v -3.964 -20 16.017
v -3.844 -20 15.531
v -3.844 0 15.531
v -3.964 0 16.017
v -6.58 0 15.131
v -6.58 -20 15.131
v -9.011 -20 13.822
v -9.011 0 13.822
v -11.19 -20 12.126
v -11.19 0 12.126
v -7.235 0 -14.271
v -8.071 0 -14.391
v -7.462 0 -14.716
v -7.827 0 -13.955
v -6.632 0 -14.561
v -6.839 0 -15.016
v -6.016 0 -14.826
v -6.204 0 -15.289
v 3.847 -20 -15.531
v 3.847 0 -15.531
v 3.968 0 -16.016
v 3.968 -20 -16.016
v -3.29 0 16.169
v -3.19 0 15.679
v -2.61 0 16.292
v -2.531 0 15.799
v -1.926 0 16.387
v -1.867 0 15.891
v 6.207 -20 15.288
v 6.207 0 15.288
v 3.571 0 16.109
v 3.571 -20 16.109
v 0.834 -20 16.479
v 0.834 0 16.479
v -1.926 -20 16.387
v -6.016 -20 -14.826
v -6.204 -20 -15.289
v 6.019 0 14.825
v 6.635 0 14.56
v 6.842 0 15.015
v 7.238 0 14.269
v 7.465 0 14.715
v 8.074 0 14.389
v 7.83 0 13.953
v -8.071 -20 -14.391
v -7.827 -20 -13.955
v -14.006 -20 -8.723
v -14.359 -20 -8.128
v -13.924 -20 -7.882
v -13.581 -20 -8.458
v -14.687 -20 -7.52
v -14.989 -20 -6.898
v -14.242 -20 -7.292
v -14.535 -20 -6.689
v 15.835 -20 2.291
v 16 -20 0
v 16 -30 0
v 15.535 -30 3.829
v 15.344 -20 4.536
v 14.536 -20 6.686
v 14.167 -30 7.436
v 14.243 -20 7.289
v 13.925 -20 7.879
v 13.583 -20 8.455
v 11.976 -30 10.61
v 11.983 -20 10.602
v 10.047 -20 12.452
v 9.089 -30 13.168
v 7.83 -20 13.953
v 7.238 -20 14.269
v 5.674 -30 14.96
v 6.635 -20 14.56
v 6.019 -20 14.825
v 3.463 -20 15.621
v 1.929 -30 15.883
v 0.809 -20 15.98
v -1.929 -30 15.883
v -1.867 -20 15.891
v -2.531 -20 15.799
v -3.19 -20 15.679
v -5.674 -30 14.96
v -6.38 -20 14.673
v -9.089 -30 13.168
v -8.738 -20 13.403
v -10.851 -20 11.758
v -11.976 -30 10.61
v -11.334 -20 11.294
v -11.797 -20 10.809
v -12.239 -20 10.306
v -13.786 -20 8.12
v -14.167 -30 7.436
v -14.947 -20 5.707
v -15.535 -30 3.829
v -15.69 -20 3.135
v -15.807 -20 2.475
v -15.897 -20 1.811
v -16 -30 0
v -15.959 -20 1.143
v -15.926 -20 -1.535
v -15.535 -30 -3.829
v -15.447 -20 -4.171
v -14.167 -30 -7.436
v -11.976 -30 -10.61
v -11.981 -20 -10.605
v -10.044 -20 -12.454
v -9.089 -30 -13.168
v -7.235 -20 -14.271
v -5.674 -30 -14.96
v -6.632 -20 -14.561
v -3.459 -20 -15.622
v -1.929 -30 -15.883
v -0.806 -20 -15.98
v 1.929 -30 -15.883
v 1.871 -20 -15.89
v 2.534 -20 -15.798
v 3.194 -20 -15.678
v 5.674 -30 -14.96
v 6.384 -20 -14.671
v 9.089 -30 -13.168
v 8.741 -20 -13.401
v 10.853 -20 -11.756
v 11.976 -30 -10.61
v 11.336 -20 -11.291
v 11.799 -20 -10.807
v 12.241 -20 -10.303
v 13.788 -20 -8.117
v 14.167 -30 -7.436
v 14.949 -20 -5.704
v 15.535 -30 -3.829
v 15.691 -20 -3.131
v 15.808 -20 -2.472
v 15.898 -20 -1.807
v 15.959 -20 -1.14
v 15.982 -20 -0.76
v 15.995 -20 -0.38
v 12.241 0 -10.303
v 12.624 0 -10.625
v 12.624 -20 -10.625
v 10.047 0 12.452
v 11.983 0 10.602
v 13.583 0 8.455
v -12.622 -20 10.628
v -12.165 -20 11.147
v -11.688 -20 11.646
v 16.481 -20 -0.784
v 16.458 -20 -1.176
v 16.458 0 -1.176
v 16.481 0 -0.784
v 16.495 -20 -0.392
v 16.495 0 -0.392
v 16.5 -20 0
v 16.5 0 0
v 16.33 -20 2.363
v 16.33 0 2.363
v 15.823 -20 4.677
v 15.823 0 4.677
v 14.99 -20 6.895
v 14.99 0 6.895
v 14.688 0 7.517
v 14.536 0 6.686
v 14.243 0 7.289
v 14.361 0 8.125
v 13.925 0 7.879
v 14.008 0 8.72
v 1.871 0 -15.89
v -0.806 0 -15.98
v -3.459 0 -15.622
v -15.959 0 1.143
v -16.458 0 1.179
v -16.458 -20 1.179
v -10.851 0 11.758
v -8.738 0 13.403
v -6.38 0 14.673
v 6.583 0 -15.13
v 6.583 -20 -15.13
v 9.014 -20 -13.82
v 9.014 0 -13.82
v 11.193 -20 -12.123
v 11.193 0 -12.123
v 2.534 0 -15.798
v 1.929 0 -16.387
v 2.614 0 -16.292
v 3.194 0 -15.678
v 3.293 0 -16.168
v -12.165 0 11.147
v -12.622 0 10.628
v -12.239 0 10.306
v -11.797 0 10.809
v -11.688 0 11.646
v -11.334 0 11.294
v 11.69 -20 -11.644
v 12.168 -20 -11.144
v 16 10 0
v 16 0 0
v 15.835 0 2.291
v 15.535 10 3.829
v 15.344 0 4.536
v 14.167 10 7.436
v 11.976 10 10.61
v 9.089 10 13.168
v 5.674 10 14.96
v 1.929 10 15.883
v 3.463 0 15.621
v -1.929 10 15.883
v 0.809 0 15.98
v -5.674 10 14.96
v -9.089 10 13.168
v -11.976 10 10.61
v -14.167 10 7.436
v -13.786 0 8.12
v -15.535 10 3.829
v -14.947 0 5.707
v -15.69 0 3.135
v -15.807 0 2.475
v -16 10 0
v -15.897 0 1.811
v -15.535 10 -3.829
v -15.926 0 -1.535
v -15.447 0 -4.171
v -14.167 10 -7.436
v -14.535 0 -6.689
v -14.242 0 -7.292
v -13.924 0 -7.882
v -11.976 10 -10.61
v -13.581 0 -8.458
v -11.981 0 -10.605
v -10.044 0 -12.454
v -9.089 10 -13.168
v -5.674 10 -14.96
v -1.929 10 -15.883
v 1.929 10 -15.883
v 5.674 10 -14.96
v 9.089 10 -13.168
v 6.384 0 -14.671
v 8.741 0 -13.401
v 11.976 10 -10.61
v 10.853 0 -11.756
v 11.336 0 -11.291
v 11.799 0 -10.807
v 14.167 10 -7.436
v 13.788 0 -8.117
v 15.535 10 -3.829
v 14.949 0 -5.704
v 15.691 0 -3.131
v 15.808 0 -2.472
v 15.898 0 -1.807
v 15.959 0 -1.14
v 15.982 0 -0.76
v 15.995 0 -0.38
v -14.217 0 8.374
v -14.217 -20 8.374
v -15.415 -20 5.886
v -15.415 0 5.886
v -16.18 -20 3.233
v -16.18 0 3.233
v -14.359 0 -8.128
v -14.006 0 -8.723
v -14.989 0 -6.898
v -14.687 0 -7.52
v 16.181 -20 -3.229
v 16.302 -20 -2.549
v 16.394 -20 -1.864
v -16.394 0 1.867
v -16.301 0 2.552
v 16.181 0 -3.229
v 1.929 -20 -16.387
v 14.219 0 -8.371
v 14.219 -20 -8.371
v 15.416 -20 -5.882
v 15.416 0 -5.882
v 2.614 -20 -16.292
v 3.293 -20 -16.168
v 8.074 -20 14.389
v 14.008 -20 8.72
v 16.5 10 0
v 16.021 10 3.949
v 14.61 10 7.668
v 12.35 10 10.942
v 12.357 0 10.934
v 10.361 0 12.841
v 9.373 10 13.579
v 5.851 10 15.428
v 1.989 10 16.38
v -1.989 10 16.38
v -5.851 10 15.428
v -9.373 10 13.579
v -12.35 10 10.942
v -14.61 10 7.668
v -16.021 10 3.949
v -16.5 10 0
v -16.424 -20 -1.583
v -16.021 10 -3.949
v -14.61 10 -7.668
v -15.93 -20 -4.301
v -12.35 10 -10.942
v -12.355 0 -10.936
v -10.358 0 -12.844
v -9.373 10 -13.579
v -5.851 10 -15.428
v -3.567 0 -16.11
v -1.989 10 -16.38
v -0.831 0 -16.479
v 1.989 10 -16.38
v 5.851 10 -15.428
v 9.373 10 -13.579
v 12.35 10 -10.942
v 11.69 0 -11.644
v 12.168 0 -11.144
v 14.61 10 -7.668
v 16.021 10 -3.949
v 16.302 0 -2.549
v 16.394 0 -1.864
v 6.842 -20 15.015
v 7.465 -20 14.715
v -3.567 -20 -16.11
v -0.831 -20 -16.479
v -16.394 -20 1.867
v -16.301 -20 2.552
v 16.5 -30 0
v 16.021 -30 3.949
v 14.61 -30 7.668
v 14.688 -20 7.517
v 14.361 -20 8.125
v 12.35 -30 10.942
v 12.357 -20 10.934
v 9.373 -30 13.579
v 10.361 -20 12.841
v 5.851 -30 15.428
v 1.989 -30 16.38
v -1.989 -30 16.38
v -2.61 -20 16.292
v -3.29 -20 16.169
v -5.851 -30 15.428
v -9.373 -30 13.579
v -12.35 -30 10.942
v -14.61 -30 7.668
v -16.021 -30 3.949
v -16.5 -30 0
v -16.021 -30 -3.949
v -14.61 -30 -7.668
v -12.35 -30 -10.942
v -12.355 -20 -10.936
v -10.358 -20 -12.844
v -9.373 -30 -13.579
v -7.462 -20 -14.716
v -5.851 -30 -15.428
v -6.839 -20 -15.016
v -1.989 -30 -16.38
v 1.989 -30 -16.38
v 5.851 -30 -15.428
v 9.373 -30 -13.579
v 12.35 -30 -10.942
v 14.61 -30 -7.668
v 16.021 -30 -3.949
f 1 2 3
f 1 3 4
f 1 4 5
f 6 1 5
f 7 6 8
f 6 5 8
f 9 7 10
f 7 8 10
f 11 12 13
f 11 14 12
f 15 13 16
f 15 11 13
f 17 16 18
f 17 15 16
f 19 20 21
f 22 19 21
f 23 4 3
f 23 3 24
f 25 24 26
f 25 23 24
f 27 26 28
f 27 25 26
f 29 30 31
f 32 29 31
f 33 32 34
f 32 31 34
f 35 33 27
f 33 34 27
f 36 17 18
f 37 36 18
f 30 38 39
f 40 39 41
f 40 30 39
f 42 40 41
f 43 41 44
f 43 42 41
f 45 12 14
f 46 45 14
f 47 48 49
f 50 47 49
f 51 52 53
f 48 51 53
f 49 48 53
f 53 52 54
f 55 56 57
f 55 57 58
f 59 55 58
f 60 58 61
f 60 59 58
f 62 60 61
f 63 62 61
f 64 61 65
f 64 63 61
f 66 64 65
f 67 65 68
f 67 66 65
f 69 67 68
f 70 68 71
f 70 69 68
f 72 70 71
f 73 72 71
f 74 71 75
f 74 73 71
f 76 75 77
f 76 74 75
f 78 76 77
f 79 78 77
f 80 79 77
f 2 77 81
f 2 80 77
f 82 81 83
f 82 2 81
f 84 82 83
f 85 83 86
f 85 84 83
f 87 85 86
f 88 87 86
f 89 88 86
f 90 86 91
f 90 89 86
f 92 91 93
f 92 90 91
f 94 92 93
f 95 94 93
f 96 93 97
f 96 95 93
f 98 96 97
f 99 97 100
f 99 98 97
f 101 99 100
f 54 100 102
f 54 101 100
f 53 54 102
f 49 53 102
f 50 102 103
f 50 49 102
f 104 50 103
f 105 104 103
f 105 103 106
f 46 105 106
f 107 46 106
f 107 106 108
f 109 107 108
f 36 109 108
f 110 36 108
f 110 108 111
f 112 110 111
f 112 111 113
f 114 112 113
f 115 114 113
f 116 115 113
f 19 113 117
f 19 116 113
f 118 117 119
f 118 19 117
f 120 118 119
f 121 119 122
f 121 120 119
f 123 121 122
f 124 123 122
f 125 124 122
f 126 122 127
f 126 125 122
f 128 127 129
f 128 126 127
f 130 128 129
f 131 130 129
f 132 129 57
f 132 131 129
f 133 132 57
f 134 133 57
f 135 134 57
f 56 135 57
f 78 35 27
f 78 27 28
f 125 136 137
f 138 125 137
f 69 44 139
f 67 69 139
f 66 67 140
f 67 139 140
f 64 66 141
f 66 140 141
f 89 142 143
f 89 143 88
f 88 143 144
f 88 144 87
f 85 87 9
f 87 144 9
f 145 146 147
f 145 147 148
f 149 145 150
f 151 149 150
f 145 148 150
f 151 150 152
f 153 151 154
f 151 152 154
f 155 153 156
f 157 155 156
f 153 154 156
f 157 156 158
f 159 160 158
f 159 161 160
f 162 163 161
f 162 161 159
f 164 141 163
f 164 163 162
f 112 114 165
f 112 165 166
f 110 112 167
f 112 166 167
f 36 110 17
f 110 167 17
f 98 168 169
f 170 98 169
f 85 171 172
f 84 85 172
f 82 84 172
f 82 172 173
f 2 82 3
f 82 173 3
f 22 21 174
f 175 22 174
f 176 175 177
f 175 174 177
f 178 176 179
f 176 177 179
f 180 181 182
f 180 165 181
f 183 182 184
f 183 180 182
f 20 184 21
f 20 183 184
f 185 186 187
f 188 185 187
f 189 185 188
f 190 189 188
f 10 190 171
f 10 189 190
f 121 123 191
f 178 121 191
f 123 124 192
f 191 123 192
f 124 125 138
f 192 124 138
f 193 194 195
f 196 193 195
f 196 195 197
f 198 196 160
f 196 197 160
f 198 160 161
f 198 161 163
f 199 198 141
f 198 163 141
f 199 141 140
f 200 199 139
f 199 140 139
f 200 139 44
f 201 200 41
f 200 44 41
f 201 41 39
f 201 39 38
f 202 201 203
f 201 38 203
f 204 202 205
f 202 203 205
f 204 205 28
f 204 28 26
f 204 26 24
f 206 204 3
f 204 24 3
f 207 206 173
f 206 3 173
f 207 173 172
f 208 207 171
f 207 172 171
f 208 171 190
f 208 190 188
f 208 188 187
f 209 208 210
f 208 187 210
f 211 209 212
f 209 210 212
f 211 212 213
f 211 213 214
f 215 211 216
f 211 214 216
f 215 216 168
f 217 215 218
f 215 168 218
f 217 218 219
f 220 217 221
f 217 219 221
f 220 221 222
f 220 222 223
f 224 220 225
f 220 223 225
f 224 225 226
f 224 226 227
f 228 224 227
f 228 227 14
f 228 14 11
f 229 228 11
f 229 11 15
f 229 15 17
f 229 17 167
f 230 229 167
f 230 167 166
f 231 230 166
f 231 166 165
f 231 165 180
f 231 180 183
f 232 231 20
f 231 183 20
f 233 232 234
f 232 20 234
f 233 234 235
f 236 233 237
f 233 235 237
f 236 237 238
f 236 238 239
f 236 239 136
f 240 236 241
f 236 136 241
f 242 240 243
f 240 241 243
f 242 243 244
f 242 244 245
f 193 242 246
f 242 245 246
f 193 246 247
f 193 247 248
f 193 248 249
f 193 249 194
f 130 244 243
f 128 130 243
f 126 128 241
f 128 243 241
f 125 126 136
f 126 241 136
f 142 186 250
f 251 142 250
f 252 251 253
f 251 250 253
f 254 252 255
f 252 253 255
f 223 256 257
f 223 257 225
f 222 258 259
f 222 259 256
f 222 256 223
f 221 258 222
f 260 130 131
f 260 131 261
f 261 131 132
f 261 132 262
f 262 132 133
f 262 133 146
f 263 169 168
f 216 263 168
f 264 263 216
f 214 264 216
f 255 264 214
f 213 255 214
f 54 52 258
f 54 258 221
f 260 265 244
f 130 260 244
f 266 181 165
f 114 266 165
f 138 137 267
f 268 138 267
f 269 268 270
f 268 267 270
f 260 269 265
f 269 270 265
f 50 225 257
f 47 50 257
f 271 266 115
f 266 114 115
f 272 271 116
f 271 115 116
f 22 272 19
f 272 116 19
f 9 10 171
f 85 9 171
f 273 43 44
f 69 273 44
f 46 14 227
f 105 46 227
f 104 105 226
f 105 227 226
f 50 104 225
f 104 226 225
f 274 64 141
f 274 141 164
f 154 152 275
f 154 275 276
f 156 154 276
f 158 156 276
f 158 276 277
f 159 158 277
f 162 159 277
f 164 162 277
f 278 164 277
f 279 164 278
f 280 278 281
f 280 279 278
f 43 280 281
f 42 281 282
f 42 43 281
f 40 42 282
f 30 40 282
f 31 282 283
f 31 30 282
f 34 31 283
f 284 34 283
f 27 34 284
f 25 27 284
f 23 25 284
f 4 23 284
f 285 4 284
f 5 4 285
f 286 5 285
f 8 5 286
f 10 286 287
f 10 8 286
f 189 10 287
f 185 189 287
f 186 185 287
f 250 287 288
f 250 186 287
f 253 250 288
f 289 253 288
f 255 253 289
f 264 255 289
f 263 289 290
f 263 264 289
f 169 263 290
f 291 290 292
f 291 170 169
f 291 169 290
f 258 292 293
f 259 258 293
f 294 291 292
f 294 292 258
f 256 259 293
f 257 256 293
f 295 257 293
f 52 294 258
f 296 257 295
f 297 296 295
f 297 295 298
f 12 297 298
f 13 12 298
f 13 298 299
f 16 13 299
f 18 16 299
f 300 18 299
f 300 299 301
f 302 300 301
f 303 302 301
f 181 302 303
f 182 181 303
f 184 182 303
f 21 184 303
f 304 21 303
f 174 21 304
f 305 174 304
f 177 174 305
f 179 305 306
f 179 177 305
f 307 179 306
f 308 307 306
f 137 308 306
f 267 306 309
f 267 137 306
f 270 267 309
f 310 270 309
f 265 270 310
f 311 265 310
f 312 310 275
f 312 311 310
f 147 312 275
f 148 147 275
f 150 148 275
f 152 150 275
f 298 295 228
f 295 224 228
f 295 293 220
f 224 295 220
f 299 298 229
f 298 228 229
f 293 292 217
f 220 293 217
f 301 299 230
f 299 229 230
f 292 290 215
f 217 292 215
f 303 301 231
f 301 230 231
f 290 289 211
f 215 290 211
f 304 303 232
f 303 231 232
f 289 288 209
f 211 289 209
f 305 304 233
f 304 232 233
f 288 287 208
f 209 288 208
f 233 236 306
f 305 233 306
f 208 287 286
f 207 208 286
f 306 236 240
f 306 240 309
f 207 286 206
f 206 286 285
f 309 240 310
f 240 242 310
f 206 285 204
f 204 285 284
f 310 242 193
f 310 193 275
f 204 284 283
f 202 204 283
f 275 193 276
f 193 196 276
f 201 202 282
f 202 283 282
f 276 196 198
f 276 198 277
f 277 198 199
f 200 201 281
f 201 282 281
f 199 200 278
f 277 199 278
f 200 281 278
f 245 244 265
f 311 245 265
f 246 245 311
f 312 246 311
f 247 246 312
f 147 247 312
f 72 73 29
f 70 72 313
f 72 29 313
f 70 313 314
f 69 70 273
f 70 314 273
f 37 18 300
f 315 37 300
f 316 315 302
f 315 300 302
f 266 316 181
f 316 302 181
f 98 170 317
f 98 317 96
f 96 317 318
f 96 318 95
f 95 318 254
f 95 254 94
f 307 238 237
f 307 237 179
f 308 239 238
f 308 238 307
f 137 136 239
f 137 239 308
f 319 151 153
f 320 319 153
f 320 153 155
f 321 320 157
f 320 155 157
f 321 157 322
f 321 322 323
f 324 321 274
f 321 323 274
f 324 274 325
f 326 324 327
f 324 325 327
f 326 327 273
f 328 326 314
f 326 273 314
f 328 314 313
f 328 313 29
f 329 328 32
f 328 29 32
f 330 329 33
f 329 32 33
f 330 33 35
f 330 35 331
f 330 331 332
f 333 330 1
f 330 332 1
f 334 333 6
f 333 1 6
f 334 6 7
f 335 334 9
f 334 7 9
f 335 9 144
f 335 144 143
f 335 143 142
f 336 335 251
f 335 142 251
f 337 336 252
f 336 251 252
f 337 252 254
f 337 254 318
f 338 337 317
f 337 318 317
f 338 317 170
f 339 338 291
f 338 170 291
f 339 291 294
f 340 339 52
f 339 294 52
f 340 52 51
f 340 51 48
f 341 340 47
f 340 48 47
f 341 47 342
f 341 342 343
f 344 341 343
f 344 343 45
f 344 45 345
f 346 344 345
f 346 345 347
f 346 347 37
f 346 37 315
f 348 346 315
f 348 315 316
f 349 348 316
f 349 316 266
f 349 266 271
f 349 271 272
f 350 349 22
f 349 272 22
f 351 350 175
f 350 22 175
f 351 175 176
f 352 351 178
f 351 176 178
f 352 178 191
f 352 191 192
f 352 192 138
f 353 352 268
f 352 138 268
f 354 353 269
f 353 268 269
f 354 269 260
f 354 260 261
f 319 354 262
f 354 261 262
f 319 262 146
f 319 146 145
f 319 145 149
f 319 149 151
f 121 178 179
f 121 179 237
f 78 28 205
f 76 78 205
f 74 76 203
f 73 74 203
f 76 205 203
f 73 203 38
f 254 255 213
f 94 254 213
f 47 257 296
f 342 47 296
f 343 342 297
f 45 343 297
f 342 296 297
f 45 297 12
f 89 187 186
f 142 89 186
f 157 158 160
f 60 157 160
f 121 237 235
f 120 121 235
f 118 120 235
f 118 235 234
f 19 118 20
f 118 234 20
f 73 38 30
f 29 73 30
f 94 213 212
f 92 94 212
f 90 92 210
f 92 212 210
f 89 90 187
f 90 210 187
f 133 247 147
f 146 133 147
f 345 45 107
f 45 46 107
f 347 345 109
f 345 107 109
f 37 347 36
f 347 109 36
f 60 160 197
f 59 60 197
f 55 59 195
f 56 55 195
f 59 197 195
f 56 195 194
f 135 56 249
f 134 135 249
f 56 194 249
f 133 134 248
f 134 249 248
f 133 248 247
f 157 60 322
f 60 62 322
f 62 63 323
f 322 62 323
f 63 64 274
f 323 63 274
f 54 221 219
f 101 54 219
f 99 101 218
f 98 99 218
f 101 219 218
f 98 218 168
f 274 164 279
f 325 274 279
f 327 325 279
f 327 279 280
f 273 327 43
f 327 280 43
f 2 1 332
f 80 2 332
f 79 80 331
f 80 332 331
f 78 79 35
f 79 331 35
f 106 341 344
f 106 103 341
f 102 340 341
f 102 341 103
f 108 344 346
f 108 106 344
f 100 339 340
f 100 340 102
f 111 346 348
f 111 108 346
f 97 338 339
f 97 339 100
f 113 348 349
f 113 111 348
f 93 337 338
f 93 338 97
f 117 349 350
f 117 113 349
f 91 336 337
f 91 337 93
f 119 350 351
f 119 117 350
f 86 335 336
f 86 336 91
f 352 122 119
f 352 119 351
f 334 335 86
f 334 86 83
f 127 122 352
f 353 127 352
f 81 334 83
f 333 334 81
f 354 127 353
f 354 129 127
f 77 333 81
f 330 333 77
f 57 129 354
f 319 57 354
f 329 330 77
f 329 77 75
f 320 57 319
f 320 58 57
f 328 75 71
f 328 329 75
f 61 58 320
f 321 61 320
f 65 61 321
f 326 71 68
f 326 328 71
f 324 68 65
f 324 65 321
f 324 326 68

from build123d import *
from build123d import SkipClean  # not in build123d's __all__

# Parameters (mm, degrees)
F1_DEPTH = 20
F2_R     = 16.5
F2_R_2   = 16
F3_DEPTH = 10
F4_R     = 16.5
F4_R_2   = 16
F5_DEPTH = 10


with BuildPart() as f1:
    # F0 (on Front) → F1 (new body)
    with BuildSketch(Plane.XZ):
        with BuildLine():
            Line((-3.8441673982, 15.5313353262), (-3.9642976294, 16.0166895551))
            ThreePointArc((-3.9642976294, 16.0166895551), (-7.8229406478, 14.52761507), (-11.1900395345, 12.1257171011))
            Line((-11.1900395345, 12.1257171011), (-10.8509474274, 11.7582711284))
            ThreePointArc((-10.8509474274, 11.7582711284), (-7.5858818403, 14.0873843103), (-3.8441673982, 15.5313353262))
        make_face()
    extrude(amount=F1_DEPTH)



with BuildPart() as f1b:
    # F0 (on Front) → F1, piece 2 (new body)
    with BuildSketch(Plane.XZ):
        with BuildLine():
            ThreePointArc((-15.6899392355, 3.1346142961), (-14.4174640671, 6.9380638419), (-12.2390866075, 10.3055693202))
            Line((-12.2390866075, 10.3055693202), (-12.621558064, 10.6276183614))
            ThreePointArc((-12.621558064, 10.6276183614), (-14.8680098192, 7.154878337), (-16.1802498366, 3.2325709928))
            Line((-16.1802498366, 3.2325709928), (-15.6899392355, 3.1346142961))
        make_face()
    extrude(amount=F1_DEPTH)


with BuildPart() as f1c:
    # F0 (on Front) → F1, piece 3 (new body)
    with BuildSketch(Plane.XZ):
        with BuildLine():
            Line((-15.959090724, 1.1434261073), (-16.4578123091, 1.1791581731))
            ThreePointArc((-16.4578123091, 1.1791581731), (-16.2336959024, -2.952476477), (-14.9887120925, -6.8984425639))
            Line((-14.9887120925, -6.8984425639), (-14.5345086958, -6.6893988498))
            ThreePointArc((-14.5345086958, -6.6893988498), (-15.7417657236, -2.8630074928), (-15.959090724, 1.1434261073))
        make_face()
    extrude(amount=F1_DEPTH)


with BuildPart() as f1d:
    # F0 (on Front) → F1, piece 4 (new body)
    with BuildSketch(Plane.XZ):
        with BuildLine():
            Line((-13.581495765, -8.458307915), (-14.0059175077, -8.7226300373))
            ThreePointArc((-14.0059175077, -8.7226300373), (-11.3966659743, -11.9317226195), (-8.0713200038, -14.3911011877))
            Line((-8.0713200038, -14.3911011877), (-7.8267345492, -13.9550072124))
            ThreePointArc((-7.8267345492, -13.9550072124), (-11.05131246, -11.5701552674), (-13.581495765, -8.458307915))
        make_face()
    extrude(amount=F1_DEPTH)


with BuildPart() as f1e:
    # F0 (on Front) → F1, piece 5 (new body)
    with BuildSketch(Plane.XZ):
        with BuildLine():
            Line((-6.0159922312, -14.8259177616), (-6.2039919884, -15.2892276917))
            ThreePointArc((-6.2039919884, -15.2892276917), (-2.2068058623, -16.3517585564), (1.9290419923, -16.3868482934))
            Line((1.9290419923, -16.3868482934), (1.8705861743, -15.890277133))
            ThreePointArc((1.8705861743, -15.890277133), (-2.1399329573, -15.8562507213), (-6.0159922312, -14.8259177616))
        make_face()
    extrude(amount=F1_DEPTH)


with BuildPart() as f1f:
    # F0 (on Front) → F1, piece 6 (new body)
    with BuildSketch(Plane.XZ):
        with BuildLine():
            Line((6.0190930987, 14.8246591282), (6.2071897581, 15.287929726))
            ThreePointArc((6.2071897581, 15.287929726), (2.210225959, 16.3512966217), (-1.9256144656, 16.3872514147))
            Line((-1.9256144656, 16.3872514147), (-1.8672625121, 15.8906680385))
            ThreePointArc((-1.8672625121, 15.8906680385), (2.1432494148, 15.8558027847), (6.0190930987, 14.8246591282))
        make_face()
    extrude(amount=F1_DEPTH)


with BuildPart() as f1g:
    # F0 (on Front) → F1, piece 7 (new body)
    with BuildSketch(Plane.XZ):
        with BuildLine():
            ThreePointArc((14.0077416326, 8.7197003592), (11.3991613724, 11.929338624), (8.0743298799, 14.3894126701))
            Line((8.0743298799, 14.3894126701), (7.8296532169, 13.9533698619))
            ThreePointArc((7.8296532169, 13.9533698619), (11.0537322399, 11.5678435142), (13.5832646134, 8.455467015))
            Line((13.5832646134, 8.455467015), (14.0077416326, 8.7197003592))
        make_face()
    extrude(amount=F1_DEPTH)


with BuildPart() as f1h:
    # F0 (on Front) → F1, piece 8 (new body)
    with BuildSketch(Plane.XZ):
        with BuildLine():
            ThreePointArc((16.4580585827, -1.17571582), (16.2336959024, 2.952476477), (14.9901546477, 6.8953073636))
            Line((14.9901546477, 6.8953073636), (14.5359075371, 6.6863586557))
            ThreePointArc((14.5359075371, 6.6863586557), (15.7417657236, 2.8630074928), (15.9593295347, -1.1400880679))
            Line((15.9593295347, -1.1400880679), (16.4580585827, -1.17571582))
        make_face()
    extrude(amount=F1_DEPTH)


with BuildPart() as f1i:
    # F0 (on Front) → F1, piece 9 (new body)
    with BuildSketch(Plane.XZ):
        with BuildLine():
            ThreePointArc((3.9676476045, -16.0158600296), (7.8259790826, -14.5259785005), (11.192575513, -12.1233763195))
            Line((11.192575513, -12.1233763195), (10.8534065581, -11.7560012795))
            ThreePointArc((10.8534065581, -11.7560012795), (7.5888282013, -14.0857973339), (3.8474158589, -15.5305309377))
            Line((3.8474158589, -15.5305309377), (3.9676476045, -16.0158600296))
        make_face()
    extrude(amount=F1_DEPTH)


with BuildPart() as f1j:
    # F0 (on Front) → F1, piece 10 (new body)
    with BuildSketch(Plane.XZ):
        with BuildLine():
            ThreePointArc((12.6237806679, -10.6249781952), (14.8695060132, -7.1517683773), (16.1809256095, -3.22918665))
            Line((16.1809256095, -3.22918665), (15.6905945304, -3.1313325091))
            ThreePointArc((15.6905945304, -3.1313325091), (14.4189149219, -6.9350481235), (12.2412418598, -10.303009159))
            Line((12.2412418598, -10.303009159), (12.6237806679, -10.6249781952))
        make_face()
    extrude(amount=F1_DEPTH)


with BuildPart() as f1_1:
    add(f1.part, clean=False)

    add(f1b.part)  # F3 merges F1b

    add(f1c.part)  # F3 merges F1c

    add(f1d.part)  # F3 merges F1d

    add(f1e.part)  # F3 merges F1e

    add(f1f.part)  # F3 merges F1f

    add(f1g.part)  # F3 merges F1g

    add(f1h.part)  # F3 merges F1h

    add(f1i.part)  # F3 merges F1i

    add(f1j.part)  # F3 merges F1j
    # F2 (on face) → F3 (join)
    with BuildSketch(Plane.XZ):
        Circle(F2_R)
        Circle(F2_R_2, mode=Mode.SUBTRACT)
    extrude(amount=-F3_DEPTH)

    # F4 (on face) → F5 (join)
    with BuildSketch(Plane.XZ.offset(20)):
        Circle(F4_R)
        Circle(F4_R_2, mode=Mode.SUBTRACT)
    with SkipClean():  # cleaning this boolean's faces spoils the solid; the shape is the same uncleaned
        extrude(amount=F5_DEPTH)


solid = f1_1.part
